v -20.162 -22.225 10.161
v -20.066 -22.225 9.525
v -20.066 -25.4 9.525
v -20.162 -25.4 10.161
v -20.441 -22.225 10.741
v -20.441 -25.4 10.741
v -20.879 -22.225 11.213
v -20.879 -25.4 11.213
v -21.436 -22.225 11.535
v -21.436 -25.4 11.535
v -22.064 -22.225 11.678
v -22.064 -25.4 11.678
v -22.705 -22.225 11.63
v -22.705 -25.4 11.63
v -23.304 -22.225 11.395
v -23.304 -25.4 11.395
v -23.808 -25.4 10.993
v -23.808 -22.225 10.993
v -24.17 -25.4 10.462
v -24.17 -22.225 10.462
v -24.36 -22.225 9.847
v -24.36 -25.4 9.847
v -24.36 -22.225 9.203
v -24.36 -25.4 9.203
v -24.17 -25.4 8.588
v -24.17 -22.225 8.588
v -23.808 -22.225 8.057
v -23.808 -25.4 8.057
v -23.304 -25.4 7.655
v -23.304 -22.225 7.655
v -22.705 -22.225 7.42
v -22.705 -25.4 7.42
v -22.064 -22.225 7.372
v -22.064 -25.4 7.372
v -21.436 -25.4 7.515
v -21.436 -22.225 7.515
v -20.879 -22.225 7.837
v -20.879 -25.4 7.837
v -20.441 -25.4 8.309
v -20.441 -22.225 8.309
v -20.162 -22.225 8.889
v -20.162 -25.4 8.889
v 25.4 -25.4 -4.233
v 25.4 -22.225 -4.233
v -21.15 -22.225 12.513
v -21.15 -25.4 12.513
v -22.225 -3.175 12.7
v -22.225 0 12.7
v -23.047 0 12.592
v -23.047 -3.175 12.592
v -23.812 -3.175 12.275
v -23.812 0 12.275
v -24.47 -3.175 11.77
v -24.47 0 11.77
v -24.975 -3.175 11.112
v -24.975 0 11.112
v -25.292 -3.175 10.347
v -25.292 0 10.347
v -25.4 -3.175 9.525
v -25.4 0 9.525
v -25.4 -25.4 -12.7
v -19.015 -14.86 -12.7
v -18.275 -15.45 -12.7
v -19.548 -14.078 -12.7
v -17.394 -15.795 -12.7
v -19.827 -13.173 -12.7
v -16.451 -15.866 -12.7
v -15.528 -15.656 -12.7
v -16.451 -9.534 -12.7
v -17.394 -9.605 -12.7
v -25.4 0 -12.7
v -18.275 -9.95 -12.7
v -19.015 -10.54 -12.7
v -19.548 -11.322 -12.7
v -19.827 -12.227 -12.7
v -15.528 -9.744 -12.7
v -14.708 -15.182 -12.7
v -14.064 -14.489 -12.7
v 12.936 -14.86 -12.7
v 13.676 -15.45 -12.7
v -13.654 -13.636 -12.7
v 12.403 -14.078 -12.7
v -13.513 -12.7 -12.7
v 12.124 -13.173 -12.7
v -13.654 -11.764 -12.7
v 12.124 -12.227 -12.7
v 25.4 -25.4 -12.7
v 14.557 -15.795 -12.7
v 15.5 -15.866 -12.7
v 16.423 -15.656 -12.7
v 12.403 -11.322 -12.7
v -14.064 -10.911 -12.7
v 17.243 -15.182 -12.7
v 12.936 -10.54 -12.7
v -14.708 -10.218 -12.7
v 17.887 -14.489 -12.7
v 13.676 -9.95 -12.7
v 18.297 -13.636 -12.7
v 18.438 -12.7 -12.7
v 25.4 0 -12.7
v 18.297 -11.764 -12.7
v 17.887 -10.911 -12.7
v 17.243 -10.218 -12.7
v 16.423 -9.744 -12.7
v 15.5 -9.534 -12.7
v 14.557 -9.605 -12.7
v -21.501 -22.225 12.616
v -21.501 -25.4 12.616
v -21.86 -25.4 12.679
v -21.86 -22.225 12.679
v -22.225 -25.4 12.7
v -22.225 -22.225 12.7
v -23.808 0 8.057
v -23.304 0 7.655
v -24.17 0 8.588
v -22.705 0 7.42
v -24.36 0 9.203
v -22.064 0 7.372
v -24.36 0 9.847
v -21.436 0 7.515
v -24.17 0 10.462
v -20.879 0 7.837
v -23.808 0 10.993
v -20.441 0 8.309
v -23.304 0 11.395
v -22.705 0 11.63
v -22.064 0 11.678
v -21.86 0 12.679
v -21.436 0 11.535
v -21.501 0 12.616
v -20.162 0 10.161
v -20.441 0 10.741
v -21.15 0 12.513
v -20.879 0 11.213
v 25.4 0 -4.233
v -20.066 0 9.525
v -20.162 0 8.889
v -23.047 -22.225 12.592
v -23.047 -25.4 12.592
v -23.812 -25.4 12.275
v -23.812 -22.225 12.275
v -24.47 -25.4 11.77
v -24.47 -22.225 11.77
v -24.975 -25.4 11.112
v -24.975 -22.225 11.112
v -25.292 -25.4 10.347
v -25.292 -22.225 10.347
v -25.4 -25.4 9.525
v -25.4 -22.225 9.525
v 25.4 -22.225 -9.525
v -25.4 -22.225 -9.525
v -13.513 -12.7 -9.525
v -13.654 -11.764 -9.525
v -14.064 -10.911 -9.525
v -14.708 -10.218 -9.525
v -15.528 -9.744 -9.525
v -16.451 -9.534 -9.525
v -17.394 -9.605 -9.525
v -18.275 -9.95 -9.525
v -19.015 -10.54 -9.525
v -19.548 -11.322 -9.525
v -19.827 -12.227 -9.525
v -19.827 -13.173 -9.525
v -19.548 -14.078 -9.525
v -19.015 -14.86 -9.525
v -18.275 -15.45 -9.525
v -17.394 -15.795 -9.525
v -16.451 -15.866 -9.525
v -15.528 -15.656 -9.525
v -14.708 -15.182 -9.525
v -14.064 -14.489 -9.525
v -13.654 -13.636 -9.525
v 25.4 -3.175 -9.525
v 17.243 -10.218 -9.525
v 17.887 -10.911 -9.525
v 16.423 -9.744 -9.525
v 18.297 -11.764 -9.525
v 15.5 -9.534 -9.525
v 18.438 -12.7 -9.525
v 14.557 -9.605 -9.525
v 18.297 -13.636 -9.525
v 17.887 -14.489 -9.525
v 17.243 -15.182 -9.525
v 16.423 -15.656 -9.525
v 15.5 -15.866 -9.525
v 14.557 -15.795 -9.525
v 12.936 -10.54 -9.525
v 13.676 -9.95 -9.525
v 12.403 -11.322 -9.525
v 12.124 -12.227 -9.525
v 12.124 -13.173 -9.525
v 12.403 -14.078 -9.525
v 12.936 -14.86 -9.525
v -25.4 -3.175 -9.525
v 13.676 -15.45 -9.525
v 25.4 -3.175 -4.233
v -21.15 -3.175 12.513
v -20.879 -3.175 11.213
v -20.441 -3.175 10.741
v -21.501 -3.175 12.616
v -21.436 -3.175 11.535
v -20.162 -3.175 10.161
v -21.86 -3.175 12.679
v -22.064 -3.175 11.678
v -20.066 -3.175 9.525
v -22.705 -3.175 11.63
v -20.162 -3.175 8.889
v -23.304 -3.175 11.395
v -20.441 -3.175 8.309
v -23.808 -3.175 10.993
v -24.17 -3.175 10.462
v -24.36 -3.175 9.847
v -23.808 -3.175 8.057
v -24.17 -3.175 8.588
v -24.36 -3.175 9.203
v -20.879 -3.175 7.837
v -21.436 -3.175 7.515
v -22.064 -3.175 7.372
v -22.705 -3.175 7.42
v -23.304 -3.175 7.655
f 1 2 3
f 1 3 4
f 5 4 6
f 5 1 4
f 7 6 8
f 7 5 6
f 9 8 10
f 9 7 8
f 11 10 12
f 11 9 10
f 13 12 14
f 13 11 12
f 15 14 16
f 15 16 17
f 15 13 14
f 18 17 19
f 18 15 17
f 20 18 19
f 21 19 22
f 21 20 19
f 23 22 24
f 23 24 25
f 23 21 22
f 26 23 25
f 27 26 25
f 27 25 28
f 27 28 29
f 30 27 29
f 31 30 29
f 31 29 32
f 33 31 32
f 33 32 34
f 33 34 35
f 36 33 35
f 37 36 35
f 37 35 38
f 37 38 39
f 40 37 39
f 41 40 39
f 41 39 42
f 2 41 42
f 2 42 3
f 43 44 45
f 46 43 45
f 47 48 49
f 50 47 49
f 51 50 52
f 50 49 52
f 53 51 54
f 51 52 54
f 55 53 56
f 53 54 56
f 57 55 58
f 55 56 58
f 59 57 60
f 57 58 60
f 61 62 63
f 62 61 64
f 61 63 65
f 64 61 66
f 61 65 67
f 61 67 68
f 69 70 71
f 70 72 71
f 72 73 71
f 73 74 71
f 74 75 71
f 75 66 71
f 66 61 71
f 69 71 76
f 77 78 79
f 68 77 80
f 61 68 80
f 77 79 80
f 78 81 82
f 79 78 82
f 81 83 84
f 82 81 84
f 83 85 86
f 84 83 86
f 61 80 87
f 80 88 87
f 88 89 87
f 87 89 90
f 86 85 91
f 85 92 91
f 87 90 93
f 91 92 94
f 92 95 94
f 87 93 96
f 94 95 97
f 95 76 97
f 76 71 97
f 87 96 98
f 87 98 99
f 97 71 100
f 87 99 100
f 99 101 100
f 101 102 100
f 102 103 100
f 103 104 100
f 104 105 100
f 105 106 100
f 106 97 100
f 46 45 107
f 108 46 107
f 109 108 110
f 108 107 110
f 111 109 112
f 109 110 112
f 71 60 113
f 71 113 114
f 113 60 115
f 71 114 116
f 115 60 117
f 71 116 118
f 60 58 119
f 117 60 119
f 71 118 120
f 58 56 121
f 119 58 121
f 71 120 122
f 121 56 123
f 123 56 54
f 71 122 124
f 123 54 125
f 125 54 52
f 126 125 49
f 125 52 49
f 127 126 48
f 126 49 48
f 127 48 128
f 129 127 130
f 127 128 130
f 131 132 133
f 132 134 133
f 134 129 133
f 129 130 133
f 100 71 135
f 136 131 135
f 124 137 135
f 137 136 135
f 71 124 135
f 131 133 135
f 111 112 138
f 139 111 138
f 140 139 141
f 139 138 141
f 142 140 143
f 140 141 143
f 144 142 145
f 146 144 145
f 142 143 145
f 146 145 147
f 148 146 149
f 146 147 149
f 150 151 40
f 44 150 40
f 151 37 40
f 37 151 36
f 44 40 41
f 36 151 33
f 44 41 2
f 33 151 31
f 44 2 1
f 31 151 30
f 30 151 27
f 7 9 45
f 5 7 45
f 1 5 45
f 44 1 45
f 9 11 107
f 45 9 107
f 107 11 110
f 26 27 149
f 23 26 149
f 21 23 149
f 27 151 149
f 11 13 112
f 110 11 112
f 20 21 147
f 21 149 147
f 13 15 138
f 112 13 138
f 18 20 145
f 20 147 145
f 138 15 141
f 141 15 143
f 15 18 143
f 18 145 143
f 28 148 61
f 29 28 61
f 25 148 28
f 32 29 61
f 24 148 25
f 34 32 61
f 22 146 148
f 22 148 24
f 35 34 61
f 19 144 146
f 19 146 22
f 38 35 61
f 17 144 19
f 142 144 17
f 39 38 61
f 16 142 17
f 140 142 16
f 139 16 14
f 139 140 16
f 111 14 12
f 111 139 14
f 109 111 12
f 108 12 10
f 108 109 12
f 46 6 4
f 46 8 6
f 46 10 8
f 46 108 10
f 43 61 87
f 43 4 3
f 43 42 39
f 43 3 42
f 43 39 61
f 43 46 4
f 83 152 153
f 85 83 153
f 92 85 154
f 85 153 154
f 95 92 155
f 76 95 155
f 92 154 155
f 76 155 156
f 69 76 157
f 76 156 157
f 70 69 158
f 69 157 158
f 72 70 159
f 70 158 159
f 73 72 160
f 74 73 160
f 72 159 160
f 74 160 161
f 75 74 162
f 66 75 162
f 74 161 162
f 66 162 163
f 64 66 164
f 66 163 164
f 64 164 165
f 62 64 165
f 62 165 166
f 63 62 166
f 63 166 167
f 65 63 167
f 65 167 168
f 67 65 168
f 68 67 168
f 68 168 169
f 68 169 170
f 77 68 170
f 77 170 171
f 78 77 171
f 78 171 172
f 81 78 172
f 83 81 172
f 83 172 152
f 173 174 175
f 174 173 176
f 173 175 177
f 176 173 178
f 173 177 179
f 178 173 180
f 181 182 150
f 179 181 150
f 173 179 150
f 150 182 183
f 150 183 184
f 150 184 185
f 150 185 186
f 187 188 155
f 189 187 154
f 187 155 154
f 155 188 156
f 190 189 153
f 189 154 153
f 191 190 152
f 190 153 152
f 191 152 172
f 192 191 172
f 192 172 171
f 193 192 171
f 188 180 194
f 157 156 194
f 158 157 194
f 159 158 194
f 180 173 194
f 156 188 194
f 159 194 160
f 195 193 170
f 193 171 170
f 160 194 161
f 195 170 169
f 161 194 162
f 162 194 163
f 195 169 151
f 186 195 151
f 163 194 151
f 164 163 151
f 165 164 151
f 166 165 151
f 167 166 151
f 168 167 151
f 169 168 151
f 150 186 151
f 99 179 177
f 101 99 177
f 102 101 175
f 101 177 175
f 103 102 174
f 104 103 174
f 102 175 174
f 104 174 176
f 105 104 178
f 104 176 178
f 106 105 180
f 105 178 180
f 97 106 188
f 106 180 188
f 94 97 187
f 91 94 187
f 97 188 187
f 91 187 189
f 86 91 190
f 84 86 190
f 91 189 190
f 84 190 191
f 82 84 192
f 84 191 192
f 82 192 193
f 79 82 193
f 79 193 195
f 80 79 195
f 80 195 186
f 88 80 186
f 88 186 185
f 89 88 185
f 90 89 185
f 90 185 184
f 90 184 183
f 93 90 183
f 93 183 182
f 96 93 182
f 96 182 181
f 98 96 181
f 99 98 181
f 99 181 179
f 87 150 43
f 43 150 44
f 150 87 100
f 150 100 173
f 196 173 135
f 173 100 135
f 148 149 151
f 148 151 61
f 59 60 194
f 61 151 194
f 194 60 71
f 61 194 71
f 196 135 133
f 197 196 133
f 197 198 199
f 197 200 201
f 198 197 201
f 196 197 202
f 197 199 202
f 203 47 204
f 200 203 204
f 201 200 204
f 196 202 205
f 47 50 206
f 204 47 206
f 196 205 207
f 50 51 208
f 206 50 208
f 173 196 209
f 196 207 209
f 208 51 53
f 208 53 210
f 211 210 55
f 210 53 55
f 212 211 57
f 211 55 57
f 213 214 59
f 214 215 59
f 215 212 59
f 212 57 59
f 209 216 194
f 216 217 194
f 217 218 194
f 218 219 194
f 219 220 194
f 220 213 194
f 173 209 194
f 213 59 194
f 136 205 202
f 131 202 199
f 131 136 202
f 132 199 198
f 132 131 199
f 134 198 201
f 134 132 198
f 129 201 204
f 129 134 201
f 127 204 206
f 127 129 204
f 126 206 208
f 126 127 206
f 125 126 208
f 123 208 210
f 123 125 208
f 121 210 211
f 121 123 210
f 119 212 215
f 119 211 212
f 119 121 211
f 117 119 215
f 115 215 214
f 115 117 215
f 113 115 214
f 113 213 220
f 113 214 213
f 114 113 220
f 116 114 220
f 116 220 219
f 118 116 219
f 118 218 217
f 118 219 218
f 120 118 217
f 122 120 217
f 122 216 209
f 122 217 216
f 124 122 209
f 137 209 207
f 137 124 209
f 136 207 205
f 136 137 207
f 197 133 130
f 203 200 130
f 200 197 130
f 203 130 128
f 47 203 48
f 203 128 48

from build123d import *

# Parameters (mm, degrees)
F0_R     = 2.159
F1_DEPTH = 25.4
F3_DEPTH = 50.801
F4_R     = 3.175
F5_DEPTH = 25.4


with BuildPart() as f1:
    # F0 (on Front) → F1 (new body)
    with BuildSketch(Plane.XZ):
        with BuildLine():
            ThreePointArc((-21.150258, 12.512567), (-21.679518, 12.652791), (-22.225, 12.7))
            ThreePointArc((-22.225, 12.7), (-24.470064, 11.770064), (-25.4, 9.525))
            Line((-25.4, 9.525), (-25.4, -12.7))
            Line((-25.4, -12.7), (25.4, -12.7))
            Line((25.4, -12.7), (25.4, -4.233333))
            Line((25.4, -4.233333), (-21.150258, 12.512567))
        make_face()
        with Locations((-22.225, 9.525)):
            Circle(F0_R, mode=Mode.SUBTRACT)
    extrude(amount=F1_DEPTH)

    # F2 (on face) → F3 (cut, through all)
    with BuildSketch(Plane(origin=(-25.4, 0, 0), x_dir=(0, -1, 0), z_dir=(-1, 0, 0))):
        Polygon((3.175, 15.972704), (3.175, -9.525), (22.225, -9.525), (22.225, 16.476365), align=None)
    extrude(amount=-F3_DEPTH, mode=Mode.SUBTRACT)

    # F4 (on face) → F5 (cut)
    with BuildSketch(Plane.XY.offset(-9.525)):
        with Locations((-16.687769, -12.7)):
            Circle(F4_R)
        with Locations((15.263206, -12.7)):
            Circle(F4_R)
    extrude(amount=-F5_DEPTH, mode=Mode.SUBTRACT)


solid = f1.part
